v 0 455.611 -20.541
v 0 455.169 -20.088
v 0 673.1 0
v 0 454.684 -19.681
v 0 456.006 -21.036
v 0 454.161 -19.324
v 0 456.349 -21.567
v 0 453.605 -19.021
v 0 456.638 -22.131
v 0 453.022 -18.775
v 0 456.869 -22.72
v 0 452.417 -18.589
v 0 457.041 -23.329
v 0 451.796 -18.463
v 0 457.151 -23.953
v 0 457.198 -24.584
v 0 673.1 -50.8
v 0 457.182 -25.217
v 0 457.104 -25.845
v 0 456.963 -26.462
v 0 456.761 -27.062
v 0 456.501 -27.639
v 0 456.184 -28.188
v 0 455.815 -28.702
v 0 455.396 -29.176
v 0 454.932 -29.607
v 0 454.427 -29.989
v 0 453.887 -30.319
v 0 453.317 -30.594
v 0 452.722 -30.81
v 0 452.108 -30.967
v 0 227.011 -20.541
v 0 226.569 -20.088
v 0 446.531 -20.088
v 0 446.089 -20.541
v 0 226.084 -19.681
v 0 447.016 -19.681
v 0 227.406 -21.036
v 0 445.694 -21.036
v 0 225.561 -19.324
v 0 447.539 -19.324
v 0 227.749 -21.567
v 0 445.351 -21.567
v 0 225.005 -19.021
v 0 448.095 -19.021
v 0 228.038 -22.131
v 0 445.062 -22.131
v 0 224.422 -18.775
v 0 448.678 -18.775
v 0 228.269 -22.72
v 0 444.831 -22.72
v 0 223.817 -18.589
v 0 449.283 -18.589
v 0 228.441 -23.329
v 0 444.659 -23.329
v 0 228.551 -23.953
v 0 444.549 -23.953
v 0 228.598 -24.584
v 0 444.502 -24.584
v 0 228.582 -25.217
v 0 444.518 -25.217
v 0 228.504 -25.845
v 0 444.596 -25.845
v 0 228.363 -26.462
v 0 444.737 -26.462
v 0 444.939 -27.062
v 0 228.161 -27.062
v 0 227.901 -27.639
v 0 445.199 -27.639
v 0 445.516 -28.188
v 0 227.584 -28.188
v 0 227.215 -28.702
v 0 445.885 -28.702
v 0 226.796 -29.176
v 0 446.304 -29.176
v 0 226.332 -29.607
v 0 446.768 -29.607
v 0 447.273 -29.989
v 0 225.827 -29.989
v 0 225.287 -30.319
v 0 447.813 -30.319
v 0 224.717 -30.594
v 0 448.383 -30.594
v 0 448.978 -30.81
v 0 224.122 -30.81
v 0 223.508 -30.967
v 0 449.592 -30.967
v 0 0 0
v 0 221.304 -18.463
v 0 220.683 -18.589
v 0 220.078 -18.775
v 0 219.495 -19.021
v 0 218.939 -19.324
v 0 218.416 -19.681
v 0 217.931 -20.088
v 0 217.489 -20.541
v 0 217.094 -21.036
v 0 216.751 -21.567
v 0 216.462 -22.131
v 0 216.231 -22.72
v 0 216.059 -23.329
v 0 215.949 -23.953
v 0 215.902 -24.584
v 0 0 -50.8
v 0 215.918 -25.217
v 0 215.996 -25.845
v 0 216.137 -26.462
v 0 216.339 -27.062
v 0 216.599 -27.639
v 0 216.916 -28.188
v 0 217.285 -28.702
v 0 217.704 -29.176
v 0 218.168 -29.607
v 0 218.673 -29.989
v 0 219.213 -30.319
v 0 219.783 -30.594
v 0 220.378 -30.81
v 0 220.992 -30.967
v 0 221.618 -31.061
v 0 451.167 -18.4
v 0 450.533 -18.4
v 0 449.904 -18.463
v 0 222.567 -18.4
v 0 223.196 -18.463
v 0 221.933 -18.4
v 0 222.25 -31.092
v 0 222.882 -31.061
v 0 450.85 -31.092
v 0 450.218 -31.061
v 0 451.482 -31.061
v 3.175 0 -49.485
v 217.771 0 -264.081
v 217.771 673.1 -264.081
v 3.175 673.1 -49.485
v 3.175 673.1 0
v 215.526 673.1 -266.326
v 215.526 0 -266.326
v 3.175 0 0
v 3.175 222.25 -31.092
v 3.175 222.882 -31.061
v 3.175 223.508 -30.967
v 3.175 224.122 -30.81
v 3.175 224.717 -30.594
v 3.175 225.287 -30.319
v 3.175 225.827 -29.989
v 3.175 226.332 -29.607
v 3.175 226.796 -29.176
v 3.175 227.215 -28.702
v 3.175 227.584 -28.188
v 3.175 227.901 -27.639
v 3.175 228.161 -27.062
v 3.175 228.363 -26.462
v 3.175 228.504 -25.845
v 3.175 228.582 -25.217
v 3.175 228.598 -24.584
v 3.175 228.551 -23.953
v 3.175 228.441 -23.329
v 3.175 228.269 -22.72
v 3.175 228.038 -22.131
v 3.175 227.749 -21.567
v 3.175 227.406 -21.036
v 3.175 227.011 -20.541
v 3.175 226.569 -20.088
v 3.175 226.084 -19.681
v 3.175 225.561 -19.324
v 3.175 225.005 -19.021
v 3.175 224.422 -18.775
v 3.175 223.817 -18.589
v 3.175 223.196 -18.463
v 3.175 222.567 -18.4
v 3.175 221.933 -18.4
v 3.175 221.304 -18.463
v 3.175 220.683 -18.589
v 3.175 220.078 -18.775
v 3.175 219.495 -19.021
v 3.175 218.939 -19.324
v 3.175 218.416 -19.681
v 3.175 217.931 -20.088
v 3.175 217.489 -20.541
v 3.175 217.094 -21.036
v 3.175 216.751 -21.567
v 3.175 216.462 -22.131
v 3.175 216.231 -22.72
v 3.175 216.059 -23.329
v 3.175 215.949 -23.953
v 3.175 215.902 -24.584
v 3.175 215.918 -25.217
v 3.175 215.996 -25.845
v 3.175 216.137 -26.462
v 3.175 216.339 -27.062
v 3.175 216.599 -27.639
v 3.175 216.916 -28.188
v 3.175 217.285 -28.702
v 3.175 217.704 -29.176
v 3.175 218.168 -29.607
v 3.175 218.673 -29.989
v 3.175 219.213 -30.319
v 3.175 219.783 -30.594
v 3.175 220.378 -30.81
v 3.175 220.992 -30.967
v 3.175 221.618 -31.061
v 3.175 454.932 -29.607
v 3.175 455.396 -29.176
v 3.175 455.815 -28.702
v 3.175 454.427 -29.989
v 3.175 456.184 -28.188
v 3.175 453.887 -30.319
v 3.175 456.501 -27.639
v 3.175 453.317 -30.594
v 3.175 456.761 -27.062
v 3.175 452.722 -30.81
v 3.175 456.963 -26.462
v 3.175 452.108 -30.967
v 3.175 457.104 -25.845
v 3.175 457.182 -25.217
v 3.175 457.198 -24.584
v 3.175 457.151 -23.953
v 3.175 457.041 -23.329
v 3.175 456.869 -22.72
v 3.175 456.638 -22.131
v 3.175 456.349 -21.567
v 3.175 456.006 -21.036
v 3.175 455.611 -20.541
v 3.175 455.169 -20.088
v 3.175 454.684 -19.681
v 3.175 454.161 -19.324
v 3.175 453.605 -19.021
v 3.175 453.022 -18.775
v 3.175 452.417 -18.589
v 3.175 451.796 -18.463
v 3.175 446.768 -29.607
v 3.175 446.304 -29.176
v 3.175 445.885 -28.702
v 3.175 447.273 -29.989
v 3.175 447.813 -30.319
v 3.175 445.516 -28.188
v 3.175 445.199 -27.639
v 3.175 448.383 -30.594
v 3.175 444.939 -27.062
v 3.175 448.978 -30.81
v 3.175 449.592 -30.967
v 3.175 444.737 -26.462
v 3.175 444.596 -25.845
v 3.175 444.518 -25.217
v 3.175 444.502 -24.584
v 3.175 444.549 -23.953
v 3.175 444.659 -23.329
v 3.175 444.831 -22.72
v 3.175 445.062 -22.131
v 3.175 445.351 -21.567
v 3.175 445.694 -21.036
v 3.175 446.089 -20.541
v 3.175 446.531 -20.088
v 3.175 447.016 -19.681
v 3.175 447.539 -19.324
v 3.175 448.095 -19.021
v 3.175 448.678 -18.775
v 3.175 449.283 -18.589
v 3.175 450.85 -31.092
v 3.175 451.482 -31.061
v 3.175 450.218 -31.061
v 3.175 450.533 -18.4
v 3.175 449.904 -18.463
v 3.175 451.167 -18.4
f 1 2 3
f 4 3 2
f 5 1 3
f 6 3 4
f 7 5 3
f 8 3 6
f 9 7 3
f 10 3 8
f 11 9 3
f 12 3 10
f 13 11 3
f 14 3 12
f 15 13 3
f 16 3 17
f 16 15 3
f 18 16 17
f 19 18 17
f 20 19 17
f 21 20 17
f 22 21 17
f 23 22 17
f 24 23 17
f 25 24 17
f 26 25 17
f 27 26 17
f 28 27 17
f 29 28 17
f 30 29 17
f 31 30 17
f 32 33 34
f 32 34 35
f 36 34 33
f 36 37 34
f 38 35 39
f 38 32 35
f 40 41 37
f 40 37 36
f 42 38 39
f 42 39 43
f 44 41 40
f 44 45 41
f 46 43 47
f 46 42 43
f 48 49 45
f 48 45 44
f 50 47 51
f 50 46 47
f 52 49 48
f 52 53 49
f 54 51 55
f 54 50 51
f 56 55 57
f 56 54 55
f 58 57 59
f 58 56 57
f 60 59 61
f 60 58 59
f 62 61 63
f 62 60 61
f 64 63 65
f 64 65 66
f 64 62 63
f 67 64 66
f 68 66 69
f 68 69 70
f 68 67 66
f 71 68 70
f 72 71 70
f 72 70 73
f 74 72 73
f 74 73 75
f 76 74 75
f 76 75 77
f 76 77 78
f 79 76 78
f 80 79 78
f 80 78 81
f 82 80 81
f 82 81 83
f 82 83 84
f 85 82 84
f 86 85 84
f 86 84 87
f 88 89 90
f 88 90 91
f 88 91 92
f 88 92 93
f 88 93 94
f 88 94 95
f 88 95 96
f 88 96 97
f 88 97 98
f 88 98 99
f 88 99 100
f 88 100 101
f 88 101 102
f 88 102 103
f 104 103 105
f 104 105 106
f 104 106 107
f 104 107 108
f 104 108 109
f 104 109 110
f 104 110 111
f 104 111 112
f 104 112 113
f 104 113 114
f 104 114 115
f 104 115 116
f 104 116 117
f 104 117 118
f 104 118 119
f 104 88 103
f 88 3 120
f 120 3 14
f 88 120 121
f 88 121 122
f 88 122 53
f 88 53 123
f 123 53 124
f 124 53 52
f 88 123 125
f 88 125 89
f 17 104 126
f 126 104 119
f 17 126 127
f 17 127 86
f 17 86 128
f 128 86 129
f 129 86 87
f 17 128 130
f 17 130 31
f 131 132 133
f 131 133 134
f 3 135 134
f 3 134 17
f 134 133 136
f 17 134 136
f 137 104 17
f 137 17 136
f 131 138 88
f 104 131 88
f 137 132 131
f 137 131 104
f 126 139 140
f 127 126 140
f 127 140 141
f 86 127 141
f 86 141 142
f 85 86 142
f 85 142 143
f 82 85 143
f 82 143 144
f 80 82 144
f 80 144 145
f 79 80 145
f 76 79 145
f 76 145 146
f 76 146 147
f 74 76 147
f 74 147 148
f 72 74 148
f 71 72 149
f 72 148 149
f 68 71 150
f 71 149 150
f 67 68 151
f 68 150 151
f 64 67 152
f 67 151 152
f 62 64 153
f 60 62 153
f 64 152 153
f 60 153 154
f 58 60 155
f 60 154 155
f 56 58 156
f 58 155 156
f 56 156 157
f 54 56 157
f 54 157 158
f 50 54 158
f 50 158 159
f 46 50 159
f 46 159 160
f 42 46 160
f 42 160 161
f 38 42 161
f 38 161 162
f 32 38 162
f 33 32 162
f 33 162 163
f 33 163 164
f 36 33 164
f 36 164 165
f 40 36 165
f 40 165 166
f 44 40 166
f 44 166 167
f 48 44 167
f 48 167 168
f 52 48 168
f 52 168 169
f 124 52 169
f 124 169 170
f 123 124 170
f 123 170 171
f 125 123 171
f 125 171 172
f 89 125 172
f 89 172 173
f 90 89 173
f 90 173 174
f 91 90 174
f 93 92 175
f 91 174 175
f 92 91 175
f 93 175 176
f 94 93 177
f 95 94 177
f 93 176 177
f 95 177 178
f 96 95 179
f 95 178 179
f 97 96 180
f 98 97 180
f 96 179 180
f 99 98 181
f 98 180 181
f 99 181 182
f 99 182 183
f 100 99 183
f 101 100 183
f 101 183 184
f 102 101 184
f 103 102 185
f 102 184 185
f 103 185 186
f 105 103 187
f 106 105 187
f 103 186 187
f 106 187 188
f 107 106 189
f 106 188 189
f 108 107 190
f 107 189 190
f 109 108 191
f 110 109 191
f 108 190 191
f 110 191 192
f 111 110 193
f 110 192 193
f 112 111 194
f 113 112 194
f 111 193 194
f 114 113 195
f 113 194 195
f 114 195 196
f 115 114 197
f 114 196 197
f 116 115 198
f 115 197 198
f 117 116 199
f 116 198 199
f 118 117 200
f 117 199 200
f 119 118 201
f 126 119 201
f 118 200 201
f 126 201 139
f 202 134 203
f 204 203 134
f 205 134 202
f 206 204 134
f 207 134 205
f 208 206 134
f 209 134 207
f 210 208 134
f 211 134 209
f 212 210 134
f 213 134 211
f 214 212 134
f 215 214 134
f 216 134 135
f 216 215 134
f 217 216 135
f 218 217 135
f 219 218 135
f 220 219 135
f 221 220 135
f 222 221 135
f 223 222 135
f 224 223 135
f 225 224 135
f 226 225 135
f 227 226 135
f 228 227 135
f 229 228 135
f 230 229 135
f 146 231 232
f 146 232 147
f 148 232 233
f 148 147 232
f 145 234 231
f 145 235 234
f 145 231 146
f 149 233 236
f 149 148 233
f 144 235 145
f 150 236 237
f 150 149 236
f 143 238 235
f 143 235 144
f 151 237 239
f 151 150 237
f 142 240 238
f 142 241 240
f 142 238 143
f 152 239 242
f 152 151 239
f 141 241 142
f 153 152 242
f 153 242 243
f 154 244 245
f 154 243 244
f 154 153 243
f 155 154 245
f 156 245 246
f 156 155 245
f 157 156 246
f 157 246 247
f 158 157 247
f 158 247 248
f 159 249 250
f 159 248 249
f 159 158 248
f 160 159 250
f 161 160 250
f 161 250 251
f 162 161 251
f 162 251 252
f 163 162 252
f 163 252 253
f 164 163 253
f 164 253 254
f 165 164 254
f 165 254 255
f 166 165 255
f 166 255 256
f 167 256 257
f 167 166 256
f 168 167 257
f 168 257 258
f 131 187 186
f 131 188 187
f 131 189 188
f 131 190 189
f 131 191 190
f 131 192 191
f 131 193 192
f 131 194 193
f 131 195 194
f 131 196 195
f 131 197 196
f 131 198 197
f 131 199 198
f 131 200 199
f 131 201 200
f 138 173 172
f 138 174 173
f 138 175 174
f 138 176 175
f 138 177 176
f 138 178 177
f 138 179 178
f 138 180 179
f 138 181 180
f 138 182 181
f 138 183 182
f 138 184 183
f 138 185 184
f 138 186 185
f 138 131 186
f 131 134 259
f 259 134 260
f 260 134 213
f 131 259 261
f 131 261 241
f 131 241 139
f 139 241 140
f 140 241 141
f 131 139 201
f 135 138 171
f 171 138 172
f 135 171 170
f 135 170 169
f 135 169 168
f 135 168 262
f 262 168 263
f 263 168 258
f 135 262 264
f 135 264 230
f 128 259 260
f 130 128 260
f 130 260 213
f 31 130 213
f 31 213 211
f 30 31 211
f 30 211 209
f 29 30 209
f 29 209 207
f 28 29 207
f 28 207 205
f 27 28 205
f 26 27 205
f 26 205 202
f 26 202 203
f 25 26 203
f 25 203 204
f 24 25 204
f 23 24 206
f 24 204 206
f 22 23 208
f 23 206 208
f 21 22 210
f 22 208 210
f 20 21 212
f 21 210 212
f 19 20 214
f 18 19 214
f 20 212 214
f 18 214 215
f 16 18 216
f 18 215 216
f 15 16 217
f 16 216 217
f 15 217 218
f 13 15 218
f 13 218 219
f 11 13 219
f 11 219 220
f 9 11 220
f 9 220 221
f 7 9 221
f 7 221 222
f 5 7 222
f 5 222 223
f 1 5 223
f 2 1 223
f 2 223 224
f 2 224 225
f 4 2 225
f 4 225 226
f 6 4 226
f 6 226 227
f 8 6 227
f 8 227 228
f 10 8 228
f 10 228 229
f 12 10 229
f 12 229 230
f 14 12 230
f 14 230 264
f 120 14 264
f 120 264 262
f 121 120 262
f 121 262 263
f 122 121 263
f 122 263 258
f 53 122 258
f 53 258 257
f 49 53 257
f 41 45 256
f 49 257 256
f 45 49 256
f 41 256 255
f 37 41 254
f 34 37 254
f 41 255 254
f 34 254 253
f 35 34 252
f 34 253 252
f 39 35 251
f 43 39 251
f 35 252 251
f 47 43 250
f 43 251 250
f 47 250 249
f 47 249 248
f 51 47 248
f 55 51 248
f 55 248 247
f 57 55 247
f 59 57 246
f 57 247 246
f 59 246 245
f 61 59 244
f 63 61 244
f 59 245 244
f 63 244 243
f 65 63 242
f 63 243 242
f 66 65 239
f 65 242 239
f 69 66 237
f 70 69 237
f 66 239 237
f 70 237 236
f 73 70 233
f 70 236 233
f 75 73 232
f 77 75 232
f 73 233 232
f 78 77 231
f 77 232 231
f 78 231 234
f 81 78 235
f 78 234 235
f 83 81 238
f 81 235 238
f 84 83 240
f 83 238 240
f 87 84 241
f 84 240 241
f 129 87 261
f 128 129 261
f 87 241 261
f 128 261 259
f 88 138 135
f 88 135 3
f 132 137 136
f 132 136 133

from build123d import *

# Parameters (mm, degrees)
BOSS_EXTRUDE1_DEPTH = 673.1
SKETCH2_R           = 6.35
CUT_EXTRUDE1_DEPTH  = 4.175


with BuildPart() as part:
    # Sketch1 → Boss-Extrude1 (new body)
    with BuildSketch(Plane(origin=(0, 0, 0), x_dir=(1, 0, 0), z_dir=(0, 1, 0))):
        Polygon((0, 0), (0, 50.8), (215.526146906, 266.326146906), (217.771210936, 264.081082875), (3.175, 49.484871939), (3.175, 0), align=None)
    extrude(amount=BOSS_EXTRUDE1_DEPTH)

    # Sketch2 → Cut-Extrude1 (cut, through all)
    with BuildSketch(Plane(origin=(3.175, 0, 0), x_dir=(0, 0, -1), z_dir=(1, 0, 0))):
        with Locations((24.74243597, 450.85)):
            Circle(SKETCH2_R)
        with Locations((24.74243597, 222.25)):
            Circle(SKETCH2_R)
    extrude(amount=-CUT_EXTRUDE1_DEPTH, mode=Mode.SUBTRACT)


solid = part.part
